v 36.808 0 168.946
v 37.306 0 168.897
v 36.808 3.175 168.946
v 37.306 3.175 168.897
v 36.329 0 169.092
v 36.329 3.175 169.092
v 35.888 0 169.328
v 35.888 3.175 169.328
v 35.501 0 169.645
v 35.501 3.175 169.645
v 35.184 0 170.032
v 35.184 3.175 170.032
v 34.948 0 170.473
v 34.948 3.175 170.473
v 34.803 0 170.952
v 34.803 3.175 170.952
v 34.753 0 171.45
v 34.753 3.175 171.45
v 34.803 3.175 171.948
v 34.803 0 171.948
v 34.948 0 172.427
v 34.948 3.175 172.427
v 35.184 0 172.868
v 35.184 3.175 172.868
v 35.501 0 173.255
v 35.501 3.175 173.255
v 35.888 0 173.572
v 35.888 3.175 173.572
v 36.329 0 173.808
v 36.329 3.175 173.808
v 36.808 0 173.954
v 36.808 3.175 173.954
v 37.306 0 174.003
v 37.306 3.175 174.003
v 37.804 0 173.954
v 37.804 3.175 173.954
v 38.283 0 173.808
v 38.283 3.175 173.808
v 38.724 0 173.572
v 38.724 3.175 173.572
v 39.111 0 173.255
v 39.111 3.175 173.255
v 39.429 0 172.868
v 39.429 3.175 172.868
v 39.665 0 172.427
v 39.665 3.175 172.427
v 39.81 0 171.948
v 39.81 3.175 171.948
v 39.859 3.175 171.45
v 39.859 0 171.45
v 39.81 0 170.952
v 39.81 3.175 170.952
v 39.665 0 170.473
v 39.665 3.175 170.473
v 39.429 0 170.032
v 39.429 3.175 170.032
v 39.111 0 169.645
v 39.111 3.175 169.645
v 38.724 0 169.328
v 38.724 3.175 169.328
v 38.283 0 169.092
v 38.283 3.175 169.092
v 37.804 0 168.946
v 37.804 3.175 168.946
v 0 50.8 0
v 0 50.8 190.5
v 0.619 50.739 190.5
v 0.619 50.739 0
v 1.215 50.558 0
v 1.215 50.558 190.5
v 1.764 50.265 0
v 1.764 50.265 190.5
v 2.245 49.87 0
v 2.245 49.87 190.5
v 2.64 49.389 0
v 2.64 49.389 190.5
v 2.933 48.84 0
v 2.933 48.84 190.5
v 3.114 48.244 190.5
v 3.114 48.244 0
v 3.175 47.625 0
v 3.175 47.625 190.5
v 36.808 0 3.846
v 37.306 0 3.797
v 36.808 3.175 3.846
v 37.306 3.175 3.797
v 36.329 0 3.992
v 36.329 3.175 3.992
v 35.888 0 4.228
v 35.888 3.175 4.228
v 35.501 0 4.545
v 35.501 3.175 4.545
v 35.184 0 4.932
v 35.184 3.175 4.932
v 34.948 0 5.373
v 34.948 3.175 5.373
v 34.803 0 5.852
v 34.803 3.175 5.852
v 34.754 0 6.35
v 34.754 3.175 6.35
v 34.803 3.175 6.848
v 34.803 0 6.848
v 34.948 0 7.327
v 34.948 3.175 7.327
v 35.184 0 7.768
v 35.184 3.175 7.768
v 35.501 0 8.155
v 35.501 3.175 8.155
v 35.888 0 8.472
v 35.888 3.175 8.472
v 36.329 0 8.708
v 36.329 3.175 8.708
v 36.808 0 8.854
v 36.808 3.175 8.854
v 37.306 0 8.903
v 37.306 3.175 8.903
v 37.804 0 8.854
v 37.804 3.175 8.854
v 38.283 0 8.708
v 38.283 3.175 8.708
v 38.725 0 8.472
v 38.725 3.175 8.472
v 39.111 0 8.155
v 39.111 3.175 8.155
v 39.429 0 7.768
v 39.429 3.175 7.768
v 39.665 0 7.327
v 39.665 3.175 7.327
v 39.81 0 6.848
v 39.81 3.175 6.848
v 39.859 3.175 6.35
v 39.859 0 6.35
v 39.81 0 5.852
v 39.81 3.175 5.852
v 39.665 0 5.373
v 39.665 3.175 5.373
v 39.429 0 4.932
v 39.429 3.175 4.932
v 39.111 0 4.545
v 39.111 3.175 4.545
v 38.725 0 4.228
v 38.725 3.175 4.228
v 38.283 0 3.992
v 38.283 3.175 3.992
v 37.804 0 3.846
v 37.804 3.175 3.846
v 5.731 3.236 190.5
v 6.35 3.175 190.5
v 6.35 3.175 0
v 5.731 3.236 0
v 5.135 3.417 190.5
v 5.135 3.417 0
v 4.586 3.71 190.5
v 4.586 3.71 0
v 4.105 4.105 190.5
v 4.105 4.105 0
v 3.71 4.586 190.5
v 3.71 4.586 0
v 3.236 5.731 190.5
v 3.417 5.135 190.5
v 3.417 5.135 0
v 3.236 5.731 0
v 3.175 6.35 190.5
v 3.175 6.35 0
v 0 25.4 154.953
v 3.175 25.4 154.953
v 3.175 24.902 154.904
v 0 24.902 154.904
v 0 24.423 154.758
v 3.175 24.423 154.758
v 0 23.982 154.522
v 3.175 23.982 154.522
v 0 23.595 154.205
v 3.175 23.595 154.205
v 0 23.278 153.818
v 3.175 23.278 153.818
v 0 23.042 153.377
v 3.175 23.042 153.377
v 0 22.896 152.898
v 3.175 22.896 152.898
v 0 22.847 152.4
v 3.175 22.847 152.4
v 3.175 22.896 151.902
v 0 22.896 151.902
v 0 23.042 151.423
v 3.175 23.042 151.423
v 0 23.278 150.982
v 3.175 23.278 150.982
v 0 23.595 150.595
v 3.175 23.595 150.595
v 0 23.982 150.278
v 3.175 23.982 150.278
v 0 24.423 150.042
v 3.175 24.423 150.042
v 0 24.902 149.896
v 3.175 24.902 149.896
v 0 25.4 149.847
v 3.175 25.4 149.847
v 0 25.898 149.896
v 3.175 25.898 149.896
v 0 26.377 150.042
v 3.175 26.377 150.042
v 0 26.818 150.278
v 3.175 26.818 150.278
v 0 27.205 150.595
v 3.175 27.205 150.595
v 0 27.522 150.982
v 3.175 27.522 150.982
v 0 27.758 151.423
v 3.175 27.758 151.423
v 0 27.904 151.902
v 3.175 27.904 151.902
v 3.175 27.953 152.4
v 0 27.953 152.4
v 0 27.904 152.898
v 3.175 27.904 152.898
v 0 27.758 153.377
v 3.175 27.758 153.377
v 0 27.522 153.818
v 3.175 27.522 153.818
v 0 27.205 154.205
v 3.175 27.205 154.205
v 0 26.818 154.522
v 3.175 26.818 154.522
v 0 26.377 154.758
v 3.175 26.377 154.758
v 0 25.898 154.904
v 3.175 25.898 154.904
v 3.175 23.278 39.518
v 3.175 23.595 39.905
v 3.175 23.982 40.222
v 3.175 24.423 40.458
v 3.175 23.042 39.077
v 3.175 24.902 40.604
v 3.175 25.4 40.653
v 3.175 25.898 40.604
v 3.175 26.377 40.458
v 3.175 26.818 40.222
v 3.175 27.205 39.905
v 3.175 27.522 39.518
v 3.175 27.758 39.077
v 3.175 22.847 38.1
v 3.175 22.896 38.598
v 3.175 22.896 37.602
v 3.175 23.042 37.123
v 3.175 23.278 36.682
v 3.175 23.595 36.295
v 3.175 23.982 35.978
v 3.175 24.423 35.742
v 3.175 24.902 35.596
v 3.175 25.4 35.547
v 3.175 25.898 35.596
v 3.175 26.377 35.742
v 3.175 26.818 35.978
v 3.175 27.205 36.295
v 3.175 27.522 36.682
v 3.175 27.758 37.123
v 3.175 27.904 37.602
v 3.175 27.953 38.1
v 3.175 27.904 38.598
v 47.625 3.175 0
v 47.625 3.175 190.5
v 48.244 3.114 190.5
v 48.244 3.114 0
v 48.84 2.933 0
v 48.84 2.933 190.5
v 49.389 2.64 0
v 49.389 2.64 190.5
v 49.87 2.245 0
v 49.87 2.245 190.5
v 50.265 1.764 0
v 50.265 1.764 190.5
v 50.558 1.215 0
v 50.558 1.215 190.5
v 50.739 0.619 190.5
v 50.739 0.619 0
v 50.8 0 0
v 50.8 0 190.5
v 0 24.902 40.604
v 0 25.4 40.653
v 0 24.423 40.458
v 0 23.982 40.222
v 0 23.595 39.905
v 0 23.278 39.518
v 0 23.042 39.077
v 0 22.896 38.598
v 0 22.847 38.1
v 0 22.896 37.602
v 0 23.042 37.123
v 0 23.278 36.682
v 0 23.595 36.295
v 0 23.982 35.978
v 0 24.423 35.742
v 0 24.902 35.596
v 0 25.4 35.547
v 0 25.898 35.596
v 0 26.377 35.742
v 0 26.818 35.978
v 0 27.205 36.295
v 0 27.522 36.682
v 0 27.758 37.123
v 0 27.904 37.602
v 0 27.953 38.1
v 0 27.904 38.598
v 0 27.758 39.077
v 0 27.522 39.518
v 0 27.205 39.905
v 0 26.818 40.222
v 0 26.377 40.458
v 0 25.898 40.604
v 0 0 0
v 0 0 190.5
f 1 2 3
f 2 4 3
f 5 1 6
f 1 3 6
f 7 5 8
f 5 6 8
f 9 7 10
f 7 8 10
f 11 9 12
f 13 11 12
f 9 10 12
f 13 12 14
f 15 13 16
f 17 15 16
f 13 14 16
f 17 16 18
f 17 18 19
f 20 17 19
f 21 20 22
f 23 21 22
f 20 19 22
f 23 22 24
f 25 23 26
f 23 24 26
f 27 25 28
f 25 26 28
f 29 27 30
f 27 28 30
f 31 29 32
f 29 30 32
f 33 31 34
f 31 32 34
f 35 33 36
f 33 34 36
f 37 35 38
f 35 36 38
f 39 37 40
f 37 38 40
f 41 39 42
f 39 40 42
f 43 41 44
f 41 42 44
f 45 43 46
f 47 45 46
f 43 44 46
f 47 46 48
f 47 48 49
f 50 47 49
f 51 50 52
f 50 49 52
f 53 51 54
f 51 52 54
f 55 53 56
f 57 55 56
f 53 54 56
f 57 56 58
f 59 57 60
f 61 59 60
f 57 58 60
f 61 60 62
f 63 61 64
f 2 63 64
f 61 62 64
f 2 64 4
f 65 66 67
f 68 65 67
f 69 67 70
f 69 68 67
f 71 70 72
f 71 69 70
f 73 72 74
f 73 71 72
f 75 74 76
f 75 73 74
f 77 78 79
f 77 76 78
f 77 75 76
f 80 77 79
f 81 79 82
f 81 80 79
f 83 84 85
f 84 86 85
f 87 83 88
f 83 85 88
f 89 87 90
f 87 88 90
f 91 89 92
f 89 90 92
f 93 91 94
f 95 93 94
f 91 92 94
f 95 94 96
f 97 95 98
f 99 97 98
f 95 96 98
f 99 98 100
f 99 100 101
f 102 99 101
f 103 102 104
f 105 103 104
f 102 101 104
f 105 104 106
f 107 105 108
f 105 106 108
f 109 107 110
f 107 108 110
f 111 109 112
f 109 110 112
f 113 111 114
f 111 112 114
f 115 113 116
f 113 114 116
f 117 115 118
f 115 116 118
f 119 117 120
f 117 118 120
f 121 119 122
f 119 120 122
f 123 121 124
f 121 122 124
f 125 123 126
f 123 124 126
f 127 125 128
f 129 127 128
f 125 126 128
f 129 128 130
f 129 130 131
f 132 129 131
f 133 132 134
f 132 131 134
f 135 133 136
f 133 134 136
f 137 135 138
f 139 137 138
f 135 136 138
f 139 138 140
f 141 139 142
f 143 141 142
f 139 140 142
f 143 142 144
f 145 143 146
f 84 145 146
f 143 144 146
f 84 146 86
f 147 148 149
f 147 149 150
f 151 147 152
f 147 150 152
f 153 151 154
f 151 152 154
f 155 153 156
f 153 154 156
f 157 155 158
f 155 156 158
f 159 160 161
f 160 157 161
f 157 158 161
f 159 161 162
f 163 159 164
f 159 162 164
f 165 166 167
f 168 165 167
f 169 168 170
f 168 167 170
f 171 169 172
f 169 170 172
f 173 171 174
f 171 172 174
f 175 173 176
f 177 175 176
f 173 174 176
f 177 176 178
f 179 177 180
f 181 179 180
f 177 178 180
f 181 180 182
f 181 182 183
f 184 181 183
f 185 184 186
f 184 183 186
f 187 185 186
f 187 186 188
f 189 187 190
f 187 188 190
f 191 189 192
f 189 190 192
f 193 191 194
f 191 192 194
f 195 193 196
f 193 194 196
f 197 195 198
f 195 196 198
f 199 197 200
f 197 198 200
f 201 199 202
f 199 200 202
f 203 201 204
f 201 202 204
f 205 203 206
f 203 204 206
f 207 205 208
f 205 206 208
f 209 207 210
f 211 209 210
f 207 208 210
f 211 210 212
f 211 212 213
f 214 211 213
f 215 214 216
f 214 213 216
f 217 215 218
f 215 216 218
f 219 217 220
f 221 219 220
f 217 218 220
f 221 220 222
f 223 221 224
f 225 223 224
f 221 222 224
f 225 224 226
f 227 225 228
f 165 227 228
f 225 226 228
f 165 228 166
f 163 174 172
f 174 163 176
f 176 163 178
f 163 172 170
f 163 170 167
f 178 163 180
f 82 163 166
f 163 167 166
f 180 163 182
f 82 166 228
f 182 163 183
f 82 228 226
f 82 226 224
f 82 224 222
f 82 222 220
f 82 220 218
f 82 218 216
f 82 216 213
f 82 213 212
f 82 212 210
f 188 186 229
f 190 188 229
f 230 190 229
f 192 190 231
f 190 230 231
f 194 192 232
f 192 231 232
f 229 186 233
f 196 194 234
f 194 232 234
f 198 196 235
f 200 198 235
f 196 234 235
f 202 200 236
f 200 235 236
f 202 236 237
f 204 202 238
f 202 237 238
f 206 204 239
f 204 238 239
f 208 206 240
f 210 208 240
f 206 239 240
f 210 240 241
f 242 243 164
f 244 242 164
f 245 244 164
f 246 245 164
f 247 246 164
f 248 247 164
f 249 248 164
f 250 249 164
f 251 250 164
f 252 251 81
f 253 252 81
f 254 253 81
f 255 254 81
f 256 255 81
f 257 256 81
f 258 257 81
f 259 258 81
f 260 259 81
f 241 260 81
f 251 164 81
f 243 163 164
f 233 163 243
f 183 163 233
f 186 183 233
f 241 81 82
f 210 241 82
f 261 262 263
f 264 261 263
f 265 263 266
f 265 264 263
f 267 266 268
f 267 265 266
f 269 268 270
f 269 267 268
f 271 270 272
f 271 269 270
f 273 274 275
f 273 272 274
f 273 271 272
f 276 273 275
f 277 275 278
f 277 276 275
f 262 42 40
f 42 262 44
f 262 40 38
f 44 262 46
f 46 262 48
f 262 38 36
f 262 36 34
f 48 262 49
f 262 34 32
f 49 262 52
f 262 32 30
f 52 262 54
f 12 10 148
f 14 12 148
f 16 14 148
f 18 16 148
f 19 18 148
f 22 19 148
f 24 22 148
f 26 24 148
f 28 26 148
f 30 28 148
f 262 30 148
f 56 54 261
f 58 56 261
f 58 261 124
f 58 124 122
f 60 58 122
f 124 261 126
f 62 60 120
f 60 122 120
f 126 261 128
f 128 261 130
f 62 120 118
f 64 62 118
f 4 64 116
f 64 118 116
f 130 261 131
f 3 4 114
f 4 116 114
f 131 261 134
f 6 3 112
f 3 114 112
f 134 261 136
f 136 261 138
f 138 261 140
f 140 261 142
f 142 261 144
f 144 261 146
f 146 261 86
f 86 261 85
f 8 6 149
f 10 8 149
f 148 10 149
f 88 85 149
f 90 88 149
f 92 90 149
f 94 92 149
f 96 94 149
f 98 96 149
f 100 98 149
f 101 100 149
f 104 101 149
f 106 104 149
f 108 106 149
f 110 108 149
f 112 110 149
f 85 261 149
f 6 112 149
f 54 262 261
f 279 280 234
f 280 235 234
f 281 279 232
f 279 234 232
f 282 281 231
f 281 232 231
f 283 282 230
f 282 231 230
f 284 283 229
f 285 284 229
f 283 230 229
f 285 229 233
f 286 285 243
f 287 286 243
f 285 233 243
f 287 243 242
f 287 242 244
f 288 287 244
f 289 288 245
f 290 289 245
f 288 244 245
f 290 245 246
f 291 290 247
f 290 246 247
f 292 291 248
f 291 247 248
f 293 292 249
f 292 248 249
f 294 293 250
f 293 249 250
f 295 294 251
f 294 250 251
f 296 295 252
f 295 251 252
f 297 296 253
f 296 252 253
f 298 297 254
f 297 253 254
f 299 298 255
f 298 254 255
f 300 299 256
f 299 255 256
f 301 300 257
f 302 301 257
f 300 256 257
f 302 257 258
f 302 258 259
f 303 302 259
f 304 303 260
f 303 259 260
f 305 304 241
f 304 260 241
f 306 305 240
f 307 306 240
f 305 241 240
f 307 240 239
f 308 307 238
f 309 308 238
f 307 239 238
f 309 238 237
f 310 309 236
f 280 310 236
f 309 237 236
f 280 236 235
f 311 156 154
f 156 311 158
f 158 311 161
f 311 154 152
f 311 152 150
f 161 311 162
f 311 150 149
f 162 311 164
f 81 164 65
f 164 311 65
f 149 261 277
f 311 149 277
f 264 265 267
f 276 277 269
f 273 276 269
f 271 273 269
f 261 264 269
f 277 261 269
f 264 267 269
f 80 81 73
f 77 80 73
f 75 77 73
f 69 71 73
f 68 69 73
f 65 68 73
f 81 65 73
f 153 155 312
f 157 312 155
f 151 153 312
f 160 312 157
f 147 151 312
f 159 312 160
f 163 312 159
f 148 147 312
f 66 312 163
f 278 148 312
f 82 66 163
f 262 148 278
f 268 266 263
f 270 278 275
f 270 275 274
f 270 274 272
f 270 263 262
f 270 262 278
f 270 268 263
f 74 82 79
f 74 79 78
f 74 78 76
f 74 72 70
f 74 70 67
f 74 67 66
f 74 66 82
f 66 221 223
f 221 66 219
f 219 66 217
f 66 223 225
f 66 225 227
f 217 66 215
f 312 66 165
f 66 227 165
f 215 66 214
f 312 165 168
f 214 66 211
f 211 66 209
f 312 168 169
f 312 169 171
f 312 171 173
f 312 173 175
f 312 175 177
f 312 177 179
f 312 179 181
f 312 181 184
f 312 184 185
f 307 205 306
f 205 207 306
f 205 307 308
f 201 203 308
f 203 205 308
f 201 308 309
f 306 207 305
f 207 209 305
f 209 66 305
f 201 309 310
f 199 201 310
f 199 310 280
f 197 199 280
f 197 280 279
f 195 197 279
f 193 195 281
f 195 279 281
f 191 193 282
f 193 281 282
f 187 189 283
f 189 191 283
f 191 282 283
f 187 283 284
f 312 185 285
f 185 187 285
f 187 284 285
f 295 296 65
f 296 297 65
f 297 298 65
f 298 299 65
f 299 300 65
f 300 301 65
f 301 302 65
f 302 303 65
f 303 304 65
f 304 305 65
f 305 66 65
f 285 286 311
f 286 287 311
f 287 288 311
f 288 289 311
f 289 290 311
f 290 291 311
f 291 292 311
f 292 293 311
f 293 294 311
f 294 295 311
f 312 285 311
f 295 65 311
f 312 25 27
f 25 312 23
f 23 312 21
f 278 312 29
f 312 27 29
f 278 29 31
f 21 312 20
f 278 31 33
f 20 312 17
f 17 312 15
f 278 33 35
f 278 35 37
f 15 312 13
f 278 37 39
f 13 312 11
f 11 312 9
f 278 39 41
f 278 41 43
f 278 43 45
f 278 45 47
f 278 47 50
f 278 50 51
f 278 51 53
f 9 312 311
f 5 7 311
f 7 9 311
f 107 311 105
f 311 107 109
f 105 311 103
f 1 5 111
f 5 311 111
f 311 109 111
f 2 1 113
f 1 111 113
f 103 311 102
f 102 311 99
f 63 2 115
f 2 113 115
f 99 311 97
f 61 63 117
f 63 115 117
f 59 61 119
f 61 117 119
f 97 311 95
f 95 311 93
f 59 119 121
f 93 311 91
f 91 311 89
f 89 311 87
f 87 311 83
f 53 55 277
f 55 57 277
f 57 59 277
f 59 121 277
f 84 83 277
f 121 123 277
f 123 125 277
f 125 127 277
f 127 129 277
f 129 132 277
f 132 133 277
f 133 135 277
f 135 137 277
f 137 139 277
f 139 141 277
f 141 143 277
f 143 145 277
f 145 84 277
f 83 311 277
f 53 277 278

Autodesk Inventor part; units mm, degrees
ref_plane "YZ Plane" through (0, 0, 0) normal (1, 0, 0) x (0, 1, 0)
ref_plane "XZ Plane" through (0, 0, 0) normal (0, 1, 0) x (-1, 0, 0)
ref_plane "XY Plane" through (0, 0, 0) normal (0, 0, 1) x (1, 0, 0)
sketch "Sketch1" plane through (0, 0, 0) normal (0, 0, 1) x (1, 0, 0)
  line L0 (0, 0) -> (3.175, 0)
  line L1 (3.175, 6.35) -> (3.175, 47.625)
  line L2 (0, 50.8) -> (0, 50.8)
  line L3 (0, 50.8) -> (0, 0)
  line L4 (0, 0) -> (50.8, 0)
  line L5 (50.8, 0) -> (50.8, 0)
  line L6 (47.625, 3.175) -> (6.35, 3.175)
  line L7 (0, 3.175) -> (0, 0)
  arc A0 (3.175, 6.35) -> (6.35, 3.175) centre (6.35, 6.35) ccw
  arc A1 (50.8, 0) -> (47.625, 3.175) centre (47.625, 0) ccw
  arc A2 (3.175, 47.625) -> (0, 50.8) centre (0, 47.625) ccw
  point P0 (3.175, 50.8)
  dimension "d0" = 3.175
  dimension "d1" = 50.8
  dimension "d2" = 3.175
  dimension "d3" = 3.175
extrude "Bracket" add sketch "Sketch1" along normal blind 190.5
sketch "Sketch2" plane through (0, 0, 0) normal (-1, 0, 0) x (0, 0, 1)
  line L0 (0, 50.8) -> (190.5, 50.8) projected
  line L1 (0, 50.8) -> (0, 0) projected
  line L2 (0, 0) -> (190.5, 0) projected
  line L3 (38.1, 25.4) -> (152.4, 25.4)
  dimension "d6" = 114.3
  dimension "d7" = 38.1
  dimension "d8" = 25.4
hole "Mounting Holes" at (0, 25.4, 38.1) at (0, 25.4, 152.4) direction (1, 0, 0) diameter 5.1054 end through all clearance for "Flat Head Machine Screw (82)" size "#10" standard "Ansi Unified Screw Threads"
sketch "Sketch3" plane through (0, 0, 0) normal (0, -1, 0) x (1, 0, 0)
  line L0 (50.8, 190.5) -> (0, 190.5) projected
  line L1 (0, 0) -> (0, 190.5) projected
  line L2 (50.8, 0) -> (50.8, 190.5) projected
  line L3 (37.3062, 171.45) -> (37.3063, 6.35)
  dimension "d16" = 37.3062
  dimension "d17" = 19.05
  dimension "d25" = 165.1
hole "cRIO Holes" at (37.3062, 0, 171.45) at (37.3063, 0, 6.35) direction (0, 1, 0) diameter 5.1054 end through all clearance for "Flat Head Machine Screw (82)" size "#10" standard "Ansi Unified Screw Threads"
properties part number "cRIO bracket"
